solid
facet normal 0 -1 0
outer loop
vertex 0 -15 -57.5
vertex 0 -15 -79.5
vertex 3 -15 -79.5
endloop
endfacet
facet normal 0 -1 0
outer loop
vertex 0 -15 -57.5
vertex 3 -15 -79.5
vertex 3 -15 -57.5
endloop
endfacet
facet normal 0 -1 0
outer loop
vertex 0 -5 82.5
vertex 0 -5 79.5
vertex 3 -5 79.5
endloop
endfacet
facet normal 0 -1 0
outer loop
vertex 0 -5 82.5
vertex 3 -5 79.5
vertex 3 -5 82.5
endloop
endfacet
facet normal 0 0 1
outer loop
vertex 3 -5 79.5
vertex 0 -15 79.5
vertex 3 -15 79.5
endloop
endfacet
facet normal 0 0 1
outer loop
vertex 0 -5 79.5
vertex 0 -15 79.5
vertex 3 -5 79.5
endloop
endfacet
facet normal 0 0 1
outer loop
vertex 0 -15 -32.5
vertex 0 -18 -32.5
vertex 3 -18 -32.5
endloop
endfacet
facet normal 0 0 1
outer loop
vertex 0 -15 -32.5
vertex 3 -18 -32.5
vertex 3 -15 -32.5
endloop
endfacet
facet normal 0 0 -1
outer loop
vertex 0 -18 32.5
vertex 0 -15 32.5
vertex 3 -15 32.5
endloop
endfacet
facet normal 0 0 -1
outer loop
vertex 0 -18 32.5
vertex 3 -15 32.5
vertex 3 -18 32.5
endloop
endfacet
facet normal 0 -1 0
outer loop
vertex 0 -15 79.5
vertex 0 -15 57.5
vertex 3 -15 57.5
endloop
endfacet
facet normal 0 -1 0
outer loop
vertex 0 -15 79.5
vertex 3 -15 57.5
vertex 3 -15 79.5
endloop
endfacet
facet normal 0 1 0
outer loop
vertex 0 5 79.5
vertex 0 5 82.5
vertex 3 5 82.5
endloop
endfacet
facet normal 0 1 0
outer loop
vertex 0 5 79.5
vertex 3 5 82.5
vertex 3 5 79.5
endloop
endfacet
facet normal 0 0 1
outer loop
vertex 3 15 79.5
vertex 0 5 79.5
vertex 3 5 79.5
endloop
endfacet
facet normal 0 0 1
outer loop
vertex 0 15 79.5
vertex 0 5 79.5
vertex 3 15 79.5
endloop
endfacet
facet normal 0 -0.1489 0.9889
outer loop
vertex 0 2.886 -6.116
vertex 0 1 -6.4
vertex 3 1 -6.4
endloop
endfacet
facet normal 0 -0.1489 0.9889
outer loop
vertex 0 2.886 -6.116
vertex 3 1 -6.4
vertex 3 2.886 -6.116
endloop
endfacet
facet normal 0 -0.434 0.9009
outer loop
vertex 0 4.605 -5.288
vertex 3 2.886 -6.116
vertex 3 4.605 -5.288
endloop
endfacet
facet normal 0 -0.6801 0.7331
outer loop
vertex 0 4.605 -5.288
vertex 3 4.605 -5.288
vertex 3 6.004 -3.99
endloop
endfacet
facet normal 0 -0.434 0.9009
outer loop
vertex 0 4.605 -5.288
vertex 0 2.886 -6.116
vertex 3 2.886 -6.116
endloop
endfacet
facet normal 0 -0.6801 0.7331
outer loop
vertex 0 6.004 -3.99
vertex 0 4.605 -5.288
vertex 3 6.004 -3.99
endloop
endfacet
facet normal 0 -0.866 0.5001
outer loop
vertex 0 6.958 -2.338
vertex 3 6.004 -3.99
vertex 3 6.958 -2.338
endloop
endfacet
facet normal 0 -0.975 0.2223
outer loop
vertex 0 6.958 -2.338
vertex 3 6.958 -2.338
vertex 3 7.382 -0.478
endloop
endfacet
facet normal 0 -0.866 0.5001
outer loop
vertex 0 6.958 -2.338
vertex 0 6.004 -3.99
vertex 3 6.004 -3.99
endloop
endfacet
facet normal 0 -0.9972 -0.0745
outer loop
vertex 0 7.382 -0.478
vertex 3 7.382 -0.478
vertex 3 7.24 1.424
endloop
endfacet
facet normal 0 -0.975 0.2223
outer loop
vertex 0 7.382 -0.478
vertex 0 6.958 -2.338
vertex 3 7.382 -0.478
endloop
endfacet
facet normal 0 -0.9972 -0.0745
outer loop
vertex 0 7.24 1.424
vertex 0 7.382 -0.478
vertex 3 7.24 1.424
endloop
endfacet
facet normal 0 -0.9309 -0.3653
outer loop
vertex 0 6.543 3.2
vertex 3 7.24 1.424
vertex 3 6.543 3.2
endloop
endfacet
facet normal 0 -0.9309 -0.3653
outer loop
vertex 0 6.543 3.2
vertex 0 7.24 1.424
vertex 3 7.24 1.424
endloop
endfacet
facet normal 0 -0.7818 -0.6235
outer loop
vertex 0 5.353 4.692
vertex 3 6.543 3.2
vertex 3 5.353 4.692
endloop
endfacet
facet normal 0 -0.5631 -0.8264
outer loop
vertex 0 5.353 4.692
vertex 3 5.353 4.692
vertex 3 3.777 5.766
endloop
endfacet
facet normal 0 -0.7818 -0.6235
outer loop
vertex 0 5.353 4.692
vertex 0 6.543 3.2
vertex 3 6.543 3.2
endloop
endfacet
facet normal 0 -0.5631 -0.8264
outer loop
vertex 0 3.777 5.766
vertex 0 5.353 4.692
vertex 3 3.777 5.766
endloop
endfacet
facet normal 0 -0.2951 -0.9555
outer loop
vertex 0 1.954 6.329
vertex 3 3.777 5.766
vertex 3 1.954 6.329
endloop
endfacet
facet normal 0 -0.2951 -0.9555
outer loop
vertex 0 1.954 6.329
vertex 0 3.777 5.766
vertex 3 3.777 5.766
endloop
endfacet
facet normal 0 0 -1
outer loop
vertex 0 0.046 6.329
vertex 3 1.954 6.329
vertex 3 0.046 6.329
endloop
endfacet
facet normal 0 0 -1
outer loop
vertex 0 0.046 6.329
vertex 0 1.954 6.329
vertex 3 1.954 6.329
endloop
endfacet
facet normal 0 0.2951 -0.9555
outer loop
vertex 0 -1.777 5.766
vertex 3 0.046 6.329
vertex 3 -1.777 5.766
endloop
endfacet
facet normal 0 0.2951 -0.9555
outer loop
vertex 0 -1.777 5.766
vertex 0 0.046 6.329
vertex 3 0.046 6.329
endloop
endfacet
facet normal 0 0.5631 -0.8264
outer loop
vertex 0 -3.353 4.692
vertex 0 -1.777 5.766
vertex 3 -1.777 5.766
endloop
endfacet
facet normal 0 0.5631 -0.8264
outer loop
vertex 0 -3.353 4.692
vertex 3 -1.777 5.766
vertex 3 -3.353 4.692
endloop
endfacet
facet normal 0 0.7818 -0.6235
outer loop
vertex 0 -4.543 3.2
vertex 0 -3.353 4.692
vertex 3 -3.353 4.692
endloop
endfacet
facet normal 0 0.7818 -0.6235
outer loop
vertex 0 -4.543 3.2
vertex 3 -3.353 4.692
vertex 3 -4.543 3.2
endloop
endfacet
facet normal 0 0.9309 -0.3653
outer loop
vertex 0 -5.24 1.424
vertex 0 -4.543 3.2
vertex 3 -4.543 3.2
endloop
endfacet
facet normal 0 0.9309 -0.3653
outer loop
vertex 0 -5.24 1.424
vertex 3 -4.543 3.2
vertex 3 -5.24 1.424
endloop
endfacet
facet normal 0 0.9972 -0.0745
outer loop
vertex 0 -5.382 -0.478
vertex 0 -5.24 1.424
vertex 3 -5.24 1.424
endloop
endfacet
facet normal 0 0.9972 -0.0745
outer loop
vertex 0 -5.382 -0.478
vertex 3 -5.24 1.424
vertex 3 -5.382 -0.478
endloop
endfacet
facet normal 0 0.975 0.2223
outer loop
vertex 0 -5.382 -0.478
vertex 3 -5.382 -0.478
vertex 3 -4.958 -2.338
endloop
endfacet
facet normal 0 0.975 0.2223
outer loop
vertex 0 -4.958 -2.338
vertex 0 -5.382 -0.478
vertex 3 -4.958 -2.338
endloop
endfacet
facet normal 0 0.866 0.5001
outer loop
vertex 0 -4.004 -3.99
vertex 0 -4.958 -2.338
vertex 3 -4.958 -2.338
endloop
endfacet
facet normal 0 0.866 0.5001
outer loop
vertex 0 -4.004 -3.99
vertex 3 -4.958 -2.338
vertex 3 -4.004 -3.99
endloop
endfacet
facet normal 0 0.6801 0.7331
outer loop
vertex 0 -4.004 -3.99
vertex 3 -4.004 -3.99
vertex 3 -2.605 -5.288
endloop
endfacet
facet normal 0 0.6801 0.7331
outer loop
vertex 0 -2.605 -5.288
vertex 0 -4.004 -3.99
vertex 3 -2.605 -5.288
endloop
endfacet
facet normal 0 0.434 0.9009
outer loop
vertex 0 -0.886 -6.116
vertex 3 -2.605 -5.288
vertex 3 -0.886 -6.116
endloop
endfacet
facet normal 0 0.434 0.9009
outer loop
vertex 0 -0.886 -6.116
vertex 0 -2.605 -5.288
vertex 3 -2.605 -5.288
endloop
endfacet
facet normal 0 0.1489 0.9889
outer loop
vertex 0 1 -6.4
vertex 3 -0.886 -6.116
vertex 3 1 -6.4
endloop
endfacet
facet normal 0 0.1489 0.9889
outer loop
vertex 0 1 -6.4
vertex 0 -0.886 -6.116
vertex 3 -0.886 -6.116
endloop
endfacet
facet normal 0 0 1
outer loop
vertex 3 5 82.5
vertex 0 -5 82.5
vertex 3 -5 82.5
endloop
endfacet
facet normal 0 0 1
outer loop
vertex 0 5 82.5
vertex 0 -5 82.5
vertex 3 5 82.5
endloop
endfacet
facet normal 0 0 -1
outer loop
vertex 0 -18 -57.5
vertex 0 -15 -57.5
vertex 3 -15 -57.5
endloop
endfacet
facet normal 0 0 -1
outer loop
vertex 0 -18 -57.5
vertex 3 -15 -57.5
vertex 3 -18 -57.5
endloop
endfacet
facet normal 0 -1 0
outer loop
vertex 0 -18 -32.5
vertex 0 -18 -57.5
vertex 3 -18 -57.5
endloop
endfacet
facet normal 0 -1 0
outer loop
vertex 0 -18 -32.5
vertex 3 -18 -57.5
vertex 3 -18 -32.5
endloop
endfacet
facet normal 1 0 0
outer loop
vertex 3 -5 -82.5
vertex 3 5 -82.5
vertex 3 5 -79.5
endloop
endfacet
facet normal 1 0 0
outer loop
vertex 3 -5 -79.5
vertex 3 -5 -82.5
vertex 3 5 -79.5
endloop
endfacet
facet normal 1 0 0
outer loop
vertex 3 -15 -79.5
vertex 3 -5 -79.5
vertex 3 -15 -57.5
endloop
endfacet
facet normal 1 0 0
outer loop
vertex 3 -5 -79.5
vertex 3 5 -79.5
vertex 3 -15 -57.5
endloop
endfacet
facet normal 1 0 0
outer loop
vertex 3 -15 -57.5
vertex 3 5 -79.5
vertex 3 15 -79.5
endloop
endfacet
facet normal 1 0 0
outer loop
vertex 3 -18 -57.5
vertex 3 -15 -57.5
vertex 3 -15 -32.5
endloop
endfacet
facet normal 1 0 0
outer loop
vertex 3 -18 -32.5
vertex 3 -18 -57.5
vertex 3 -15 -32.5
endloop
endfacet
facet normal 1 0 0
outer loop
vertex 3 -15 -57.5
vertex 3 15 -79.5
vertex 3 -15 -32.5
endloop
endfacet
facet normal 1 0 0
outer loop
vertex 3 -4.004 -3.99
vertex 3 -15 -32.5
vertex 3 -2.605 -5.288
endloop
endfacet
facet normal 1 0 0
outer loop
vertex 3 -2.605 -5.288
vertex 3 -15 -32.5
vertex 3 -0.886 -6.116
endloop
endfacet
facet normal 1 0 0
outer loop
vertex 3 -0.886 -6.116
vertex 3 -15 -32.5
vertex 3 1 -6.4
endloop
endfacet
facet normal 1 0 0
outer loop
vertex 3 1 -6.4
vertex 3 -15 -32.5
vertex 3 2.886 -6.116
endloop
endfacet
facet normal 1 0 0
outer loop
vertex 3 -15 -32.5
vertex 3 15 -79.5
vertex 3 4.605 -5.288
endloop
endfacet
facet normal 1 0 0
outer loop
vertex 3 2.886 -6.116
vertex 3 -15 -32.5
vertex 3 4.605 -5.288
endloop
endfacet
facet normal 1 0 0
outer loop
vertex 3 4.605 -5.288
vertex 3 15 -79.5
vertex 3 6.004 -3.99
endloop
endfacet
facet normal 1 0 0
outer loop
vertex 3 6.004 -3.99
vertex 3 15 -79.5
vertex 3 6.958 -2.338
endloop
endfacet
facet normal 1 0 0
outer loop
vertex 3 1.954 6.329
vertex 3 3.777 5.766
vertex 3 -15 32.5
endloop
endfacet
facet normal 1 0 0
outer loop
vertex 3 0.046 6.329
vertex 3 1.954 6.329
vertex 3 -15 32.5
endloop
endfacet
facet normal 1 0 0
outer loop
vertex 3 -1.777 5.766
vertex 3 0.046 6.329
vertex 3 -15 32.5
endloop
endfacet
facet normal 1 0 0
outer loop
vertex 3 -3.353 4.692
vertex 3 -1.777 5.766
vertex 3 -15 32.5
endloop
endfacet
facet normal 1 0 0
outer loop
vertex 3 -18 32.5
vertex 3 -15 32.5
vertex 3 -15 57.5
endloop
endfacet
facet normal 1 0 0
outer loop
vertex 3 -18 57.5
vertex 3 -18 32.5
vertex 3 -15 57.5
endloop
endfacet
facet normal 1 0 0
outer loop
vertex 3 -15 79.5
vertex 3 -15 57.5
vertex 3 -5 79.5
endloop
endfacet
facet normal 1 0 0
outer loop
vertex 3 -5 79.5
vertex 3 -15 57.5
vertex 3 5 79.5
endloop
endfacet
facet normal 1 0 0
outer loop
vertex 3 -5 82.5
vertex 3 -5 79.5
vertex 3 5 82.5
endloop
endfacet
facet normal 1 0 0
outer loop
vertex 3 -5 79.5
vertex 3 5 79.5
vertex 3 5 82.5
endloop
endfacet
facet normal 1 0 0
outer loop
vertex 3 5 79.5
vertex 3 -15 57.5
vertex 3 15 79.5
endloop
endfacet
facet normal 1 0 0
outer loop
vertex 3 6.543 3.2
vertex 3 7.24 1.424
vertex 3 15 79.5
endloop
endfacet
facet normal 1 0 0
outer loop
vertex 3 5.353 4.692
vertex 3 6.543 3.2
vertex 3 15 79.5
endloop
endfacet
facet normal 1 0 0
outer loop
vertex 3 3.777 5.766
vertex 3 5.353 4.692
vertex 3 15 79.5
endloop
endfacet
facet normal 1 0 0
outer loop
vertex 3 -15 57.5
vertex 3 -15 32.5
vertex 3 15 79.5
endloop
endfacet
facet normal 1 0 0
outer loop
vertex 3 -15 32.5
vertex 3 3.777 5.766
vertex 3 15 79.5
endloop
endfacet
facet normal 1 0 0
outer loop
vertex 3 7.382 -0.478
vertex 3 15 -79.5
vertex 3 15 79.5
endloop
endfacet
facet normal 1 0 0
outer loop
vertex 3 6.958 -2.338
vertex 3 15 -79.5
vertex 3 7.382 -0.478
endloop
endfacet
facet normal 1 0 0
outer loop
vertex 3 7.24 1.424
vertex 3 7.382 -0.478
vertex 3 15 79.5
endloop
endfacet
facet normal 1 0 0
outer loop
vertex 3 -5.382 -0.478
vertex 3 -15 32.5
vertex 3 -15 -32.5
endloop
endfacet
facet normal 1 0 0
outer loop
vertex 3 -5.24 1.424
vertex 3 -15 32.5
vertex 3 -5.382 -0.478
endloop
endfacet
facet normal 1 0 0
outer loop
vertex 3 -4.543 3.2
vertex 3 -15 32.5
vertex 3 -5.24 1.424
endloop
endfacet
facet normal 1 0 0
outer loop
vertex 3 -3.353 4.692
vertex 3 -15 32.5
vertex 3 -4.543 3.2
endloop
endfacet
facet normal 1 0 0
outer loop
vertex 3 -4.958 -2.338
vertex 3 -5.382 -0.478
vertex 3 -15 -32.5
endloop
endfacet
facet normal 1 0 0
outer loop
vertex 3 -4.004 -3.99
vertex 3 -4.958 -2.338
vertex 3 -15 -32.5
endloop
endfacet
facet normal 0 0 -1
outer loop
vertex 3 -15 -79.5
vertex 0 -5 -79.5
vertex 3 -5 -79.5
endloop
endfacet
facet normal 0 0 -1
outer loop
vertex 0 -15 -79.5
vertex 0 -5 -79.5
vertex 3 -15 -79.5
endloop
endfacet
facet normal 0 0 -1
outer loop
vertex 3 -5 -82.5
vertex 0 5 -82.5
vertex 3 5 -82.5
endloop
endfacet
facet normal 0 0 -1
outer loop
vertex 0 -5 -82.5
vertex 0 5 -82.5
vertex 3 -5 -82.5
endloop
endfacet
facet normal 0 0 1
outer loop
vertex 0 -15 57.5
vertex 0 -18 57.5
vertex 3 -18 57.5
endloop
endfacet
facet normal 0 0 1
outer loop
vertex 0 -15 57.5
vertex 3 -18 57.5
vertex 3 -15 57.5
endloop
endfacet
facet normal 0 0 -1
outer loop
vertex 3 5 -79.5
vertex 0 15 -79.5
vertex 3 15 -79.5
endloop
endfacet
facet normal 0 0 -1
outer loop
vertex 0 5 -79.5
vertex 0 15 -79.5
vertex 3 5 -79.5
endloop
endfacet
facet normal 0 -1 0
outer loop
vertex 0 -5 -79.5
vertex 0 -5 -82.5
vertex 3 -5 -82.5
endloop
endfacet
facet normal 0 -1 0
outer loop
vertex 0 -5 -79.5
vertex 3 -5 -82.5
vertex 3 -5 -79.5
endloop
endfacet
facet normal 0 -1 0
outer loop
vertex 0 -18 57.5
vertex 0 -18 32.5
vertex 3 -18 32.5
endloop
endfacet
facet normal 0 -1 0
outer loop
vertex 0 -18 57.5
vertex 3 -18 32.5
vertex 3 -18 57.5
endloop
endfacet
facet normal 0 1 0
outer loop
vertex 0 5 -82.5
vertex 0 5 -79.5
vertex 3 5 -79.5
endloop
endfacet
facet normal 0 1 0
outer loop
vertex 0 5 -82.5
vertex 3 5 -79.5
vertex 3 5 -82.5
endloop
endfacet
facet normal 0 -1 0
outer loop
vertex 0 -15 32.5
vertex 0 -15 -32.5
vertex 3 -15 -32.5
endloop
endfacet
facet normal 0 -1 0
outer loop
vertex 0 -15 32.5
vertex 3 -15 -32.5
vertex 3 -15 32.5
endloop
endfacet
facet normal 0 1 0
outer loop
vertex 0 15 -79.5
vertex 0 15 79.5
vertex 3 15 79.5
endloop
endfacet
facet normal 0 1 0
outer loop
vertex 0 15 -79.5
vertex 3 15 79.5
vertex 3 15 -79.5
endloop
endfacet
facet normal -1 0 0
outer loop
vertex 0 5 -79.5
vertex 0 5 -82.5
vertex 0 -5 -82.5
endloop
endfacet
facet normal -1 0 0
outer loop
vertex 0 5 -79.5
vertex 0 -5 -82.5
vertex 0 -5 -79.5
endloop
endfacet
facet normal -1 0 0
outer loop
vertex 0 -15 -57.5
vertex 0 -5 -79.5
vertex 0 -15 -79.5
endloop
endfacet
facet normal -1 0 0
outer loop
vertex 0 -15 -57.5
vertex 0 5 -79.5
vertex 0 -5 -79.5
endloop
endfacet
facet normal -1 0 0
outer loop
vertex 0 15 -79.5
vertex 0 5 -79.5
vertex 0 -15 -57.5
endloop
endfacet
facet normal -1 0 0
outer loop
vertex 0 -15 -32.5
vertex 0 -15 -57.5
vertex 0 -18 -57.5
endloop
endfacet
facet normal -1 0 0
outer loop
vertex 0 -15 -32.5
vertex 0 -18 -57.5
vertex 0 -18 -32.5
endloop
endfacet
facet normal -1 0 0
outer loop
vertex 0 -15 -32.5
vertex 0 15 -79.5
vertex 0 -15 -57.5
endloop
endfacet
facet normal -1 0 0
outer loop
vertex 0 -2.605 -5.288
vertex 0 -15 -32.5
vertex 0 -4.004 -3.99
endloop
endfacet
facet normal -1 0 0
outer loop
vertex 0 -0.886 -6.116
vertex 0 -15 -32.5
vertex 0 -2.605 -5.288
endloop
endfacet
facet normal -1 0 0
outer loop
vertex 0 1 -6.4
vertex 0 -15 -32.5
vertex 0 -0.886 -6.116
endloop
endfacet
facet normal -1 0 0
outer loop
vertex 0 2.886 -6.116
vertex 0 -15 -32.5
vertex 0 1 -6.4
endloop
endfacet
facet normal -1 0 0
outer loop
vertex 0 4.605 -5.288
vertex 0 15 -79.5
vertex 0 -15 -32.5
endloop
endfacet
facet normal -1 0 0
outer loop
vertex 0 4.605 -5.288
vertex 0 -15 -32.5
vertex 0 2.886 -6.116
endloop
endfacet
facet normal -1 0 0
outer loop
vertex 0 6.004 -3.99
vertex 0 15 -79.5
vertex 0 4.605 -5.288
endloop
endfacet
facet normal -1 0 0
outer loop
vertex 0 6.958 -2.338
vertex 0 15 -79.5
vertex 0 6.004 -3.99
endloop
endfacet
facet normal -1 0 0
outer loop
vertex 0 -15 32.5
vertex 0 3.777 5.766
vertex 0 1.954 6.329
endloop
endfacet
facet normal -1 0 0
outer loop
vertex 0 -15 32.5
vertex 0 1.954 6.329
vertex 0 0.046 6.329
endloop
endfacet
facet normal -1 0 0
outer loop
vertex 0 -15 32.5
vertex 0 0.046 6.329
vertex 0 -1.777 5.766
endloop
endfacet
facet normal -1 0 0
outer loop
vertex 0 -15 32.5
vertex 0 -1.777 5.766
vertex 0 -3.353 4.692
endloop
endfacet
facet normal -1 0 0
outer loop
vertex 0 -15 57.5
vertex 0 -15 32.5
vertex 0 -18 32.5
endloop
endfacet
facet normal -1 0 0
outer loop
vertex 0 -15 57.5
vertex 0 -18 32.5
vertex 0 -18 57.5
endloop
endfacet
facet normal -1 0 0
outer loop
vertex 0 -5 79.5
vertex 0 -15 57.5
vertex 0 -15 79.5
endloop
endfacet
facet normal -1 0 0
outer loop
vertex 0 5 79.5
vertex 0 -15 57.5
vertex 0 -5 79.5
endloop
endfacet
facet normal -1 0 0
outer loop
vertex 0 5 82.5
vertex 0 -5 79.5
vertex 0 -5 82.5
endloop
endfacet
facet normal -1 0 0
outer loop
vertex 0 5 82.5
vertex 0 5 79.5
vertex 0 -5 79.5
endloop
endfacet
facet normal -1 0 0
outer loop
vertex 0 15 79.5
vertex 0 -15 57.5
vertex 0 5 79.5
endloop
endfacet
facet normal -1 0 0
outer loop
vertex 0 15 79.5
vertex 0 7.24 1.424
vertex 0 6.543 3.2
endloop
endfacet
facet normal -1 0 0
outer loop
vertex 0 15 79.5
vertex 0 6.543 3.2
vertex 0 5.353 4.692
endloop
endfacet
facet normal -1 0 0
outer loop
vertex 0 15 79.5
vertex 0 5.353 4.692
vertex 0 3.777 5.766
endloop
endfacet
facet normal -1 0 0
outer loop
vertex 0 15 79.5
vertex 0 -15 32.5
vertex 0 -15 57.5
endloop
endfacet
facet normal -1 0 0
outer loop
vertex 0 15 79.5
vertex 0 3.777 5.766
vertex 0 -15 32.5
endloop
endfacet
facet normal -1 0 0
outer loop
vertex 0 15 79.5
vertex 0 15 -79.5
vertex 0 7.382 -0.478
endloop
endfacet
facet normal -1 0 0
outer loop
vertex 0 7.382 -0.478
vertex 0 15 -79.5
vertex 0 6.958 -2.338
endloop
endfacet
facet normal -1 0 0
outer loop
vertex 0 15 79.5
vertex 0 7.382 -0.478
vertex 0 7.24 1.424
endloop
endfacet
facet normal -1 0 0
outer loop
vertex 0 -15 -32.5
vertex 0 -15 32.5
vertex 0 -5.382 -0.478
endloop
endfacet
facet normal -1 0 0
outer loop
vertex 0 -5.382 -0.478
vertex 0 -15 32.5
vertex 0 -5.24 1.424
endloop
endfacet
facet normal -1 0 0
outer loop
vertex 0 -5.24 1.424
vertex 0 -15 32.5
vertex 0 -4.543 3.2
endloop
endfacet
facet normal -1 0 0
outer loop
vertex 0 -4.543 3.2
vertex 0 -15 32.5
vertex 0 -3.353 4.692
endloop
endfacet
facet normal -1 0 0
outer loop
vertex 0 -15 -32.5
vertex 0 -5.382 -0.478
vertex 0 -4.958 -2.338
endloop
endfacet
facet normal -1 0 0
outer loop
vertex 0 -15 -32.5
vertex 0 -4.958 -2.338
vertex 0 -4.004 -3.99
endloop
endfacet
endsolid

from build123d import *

# Parameters (mm, degrees)
SKETCH2_R           = 6.4
BOSS_EXTRUDE3_DEPTH = 3


with BuildPart() as part:
    # Sketch2 → Boss-Extrude3 (new body)
    with BuildSketch(Plane(origin=(0, 0, 0), x_dir=(0, 0, -1), z_dir=(1, 0, 0))):
        Polygon((-57.5, -15), (-79.5, -15), (-79.5, -5), (-82.5, -5), (-82.5, 5), (-79.5, 5), (-79.5, 15), (79.5, 15), (79.5, 5), (82.5, 5), (82.5, -5), (79.5, -5), (79.5, -15), (57.5, -15), (57.5, -18), (32.5, -18), (32.5, -15), (-32.5, -15), (-32.5, -18), (-57.5, -18), align=None)
        with Locations((0, 1)):
            Circle(SKETCH2_R, mode=Mode.SUBTRACT)
    extrude(amount=BOSS_EXTRUDE3_DEPTH)


solid = part.part
